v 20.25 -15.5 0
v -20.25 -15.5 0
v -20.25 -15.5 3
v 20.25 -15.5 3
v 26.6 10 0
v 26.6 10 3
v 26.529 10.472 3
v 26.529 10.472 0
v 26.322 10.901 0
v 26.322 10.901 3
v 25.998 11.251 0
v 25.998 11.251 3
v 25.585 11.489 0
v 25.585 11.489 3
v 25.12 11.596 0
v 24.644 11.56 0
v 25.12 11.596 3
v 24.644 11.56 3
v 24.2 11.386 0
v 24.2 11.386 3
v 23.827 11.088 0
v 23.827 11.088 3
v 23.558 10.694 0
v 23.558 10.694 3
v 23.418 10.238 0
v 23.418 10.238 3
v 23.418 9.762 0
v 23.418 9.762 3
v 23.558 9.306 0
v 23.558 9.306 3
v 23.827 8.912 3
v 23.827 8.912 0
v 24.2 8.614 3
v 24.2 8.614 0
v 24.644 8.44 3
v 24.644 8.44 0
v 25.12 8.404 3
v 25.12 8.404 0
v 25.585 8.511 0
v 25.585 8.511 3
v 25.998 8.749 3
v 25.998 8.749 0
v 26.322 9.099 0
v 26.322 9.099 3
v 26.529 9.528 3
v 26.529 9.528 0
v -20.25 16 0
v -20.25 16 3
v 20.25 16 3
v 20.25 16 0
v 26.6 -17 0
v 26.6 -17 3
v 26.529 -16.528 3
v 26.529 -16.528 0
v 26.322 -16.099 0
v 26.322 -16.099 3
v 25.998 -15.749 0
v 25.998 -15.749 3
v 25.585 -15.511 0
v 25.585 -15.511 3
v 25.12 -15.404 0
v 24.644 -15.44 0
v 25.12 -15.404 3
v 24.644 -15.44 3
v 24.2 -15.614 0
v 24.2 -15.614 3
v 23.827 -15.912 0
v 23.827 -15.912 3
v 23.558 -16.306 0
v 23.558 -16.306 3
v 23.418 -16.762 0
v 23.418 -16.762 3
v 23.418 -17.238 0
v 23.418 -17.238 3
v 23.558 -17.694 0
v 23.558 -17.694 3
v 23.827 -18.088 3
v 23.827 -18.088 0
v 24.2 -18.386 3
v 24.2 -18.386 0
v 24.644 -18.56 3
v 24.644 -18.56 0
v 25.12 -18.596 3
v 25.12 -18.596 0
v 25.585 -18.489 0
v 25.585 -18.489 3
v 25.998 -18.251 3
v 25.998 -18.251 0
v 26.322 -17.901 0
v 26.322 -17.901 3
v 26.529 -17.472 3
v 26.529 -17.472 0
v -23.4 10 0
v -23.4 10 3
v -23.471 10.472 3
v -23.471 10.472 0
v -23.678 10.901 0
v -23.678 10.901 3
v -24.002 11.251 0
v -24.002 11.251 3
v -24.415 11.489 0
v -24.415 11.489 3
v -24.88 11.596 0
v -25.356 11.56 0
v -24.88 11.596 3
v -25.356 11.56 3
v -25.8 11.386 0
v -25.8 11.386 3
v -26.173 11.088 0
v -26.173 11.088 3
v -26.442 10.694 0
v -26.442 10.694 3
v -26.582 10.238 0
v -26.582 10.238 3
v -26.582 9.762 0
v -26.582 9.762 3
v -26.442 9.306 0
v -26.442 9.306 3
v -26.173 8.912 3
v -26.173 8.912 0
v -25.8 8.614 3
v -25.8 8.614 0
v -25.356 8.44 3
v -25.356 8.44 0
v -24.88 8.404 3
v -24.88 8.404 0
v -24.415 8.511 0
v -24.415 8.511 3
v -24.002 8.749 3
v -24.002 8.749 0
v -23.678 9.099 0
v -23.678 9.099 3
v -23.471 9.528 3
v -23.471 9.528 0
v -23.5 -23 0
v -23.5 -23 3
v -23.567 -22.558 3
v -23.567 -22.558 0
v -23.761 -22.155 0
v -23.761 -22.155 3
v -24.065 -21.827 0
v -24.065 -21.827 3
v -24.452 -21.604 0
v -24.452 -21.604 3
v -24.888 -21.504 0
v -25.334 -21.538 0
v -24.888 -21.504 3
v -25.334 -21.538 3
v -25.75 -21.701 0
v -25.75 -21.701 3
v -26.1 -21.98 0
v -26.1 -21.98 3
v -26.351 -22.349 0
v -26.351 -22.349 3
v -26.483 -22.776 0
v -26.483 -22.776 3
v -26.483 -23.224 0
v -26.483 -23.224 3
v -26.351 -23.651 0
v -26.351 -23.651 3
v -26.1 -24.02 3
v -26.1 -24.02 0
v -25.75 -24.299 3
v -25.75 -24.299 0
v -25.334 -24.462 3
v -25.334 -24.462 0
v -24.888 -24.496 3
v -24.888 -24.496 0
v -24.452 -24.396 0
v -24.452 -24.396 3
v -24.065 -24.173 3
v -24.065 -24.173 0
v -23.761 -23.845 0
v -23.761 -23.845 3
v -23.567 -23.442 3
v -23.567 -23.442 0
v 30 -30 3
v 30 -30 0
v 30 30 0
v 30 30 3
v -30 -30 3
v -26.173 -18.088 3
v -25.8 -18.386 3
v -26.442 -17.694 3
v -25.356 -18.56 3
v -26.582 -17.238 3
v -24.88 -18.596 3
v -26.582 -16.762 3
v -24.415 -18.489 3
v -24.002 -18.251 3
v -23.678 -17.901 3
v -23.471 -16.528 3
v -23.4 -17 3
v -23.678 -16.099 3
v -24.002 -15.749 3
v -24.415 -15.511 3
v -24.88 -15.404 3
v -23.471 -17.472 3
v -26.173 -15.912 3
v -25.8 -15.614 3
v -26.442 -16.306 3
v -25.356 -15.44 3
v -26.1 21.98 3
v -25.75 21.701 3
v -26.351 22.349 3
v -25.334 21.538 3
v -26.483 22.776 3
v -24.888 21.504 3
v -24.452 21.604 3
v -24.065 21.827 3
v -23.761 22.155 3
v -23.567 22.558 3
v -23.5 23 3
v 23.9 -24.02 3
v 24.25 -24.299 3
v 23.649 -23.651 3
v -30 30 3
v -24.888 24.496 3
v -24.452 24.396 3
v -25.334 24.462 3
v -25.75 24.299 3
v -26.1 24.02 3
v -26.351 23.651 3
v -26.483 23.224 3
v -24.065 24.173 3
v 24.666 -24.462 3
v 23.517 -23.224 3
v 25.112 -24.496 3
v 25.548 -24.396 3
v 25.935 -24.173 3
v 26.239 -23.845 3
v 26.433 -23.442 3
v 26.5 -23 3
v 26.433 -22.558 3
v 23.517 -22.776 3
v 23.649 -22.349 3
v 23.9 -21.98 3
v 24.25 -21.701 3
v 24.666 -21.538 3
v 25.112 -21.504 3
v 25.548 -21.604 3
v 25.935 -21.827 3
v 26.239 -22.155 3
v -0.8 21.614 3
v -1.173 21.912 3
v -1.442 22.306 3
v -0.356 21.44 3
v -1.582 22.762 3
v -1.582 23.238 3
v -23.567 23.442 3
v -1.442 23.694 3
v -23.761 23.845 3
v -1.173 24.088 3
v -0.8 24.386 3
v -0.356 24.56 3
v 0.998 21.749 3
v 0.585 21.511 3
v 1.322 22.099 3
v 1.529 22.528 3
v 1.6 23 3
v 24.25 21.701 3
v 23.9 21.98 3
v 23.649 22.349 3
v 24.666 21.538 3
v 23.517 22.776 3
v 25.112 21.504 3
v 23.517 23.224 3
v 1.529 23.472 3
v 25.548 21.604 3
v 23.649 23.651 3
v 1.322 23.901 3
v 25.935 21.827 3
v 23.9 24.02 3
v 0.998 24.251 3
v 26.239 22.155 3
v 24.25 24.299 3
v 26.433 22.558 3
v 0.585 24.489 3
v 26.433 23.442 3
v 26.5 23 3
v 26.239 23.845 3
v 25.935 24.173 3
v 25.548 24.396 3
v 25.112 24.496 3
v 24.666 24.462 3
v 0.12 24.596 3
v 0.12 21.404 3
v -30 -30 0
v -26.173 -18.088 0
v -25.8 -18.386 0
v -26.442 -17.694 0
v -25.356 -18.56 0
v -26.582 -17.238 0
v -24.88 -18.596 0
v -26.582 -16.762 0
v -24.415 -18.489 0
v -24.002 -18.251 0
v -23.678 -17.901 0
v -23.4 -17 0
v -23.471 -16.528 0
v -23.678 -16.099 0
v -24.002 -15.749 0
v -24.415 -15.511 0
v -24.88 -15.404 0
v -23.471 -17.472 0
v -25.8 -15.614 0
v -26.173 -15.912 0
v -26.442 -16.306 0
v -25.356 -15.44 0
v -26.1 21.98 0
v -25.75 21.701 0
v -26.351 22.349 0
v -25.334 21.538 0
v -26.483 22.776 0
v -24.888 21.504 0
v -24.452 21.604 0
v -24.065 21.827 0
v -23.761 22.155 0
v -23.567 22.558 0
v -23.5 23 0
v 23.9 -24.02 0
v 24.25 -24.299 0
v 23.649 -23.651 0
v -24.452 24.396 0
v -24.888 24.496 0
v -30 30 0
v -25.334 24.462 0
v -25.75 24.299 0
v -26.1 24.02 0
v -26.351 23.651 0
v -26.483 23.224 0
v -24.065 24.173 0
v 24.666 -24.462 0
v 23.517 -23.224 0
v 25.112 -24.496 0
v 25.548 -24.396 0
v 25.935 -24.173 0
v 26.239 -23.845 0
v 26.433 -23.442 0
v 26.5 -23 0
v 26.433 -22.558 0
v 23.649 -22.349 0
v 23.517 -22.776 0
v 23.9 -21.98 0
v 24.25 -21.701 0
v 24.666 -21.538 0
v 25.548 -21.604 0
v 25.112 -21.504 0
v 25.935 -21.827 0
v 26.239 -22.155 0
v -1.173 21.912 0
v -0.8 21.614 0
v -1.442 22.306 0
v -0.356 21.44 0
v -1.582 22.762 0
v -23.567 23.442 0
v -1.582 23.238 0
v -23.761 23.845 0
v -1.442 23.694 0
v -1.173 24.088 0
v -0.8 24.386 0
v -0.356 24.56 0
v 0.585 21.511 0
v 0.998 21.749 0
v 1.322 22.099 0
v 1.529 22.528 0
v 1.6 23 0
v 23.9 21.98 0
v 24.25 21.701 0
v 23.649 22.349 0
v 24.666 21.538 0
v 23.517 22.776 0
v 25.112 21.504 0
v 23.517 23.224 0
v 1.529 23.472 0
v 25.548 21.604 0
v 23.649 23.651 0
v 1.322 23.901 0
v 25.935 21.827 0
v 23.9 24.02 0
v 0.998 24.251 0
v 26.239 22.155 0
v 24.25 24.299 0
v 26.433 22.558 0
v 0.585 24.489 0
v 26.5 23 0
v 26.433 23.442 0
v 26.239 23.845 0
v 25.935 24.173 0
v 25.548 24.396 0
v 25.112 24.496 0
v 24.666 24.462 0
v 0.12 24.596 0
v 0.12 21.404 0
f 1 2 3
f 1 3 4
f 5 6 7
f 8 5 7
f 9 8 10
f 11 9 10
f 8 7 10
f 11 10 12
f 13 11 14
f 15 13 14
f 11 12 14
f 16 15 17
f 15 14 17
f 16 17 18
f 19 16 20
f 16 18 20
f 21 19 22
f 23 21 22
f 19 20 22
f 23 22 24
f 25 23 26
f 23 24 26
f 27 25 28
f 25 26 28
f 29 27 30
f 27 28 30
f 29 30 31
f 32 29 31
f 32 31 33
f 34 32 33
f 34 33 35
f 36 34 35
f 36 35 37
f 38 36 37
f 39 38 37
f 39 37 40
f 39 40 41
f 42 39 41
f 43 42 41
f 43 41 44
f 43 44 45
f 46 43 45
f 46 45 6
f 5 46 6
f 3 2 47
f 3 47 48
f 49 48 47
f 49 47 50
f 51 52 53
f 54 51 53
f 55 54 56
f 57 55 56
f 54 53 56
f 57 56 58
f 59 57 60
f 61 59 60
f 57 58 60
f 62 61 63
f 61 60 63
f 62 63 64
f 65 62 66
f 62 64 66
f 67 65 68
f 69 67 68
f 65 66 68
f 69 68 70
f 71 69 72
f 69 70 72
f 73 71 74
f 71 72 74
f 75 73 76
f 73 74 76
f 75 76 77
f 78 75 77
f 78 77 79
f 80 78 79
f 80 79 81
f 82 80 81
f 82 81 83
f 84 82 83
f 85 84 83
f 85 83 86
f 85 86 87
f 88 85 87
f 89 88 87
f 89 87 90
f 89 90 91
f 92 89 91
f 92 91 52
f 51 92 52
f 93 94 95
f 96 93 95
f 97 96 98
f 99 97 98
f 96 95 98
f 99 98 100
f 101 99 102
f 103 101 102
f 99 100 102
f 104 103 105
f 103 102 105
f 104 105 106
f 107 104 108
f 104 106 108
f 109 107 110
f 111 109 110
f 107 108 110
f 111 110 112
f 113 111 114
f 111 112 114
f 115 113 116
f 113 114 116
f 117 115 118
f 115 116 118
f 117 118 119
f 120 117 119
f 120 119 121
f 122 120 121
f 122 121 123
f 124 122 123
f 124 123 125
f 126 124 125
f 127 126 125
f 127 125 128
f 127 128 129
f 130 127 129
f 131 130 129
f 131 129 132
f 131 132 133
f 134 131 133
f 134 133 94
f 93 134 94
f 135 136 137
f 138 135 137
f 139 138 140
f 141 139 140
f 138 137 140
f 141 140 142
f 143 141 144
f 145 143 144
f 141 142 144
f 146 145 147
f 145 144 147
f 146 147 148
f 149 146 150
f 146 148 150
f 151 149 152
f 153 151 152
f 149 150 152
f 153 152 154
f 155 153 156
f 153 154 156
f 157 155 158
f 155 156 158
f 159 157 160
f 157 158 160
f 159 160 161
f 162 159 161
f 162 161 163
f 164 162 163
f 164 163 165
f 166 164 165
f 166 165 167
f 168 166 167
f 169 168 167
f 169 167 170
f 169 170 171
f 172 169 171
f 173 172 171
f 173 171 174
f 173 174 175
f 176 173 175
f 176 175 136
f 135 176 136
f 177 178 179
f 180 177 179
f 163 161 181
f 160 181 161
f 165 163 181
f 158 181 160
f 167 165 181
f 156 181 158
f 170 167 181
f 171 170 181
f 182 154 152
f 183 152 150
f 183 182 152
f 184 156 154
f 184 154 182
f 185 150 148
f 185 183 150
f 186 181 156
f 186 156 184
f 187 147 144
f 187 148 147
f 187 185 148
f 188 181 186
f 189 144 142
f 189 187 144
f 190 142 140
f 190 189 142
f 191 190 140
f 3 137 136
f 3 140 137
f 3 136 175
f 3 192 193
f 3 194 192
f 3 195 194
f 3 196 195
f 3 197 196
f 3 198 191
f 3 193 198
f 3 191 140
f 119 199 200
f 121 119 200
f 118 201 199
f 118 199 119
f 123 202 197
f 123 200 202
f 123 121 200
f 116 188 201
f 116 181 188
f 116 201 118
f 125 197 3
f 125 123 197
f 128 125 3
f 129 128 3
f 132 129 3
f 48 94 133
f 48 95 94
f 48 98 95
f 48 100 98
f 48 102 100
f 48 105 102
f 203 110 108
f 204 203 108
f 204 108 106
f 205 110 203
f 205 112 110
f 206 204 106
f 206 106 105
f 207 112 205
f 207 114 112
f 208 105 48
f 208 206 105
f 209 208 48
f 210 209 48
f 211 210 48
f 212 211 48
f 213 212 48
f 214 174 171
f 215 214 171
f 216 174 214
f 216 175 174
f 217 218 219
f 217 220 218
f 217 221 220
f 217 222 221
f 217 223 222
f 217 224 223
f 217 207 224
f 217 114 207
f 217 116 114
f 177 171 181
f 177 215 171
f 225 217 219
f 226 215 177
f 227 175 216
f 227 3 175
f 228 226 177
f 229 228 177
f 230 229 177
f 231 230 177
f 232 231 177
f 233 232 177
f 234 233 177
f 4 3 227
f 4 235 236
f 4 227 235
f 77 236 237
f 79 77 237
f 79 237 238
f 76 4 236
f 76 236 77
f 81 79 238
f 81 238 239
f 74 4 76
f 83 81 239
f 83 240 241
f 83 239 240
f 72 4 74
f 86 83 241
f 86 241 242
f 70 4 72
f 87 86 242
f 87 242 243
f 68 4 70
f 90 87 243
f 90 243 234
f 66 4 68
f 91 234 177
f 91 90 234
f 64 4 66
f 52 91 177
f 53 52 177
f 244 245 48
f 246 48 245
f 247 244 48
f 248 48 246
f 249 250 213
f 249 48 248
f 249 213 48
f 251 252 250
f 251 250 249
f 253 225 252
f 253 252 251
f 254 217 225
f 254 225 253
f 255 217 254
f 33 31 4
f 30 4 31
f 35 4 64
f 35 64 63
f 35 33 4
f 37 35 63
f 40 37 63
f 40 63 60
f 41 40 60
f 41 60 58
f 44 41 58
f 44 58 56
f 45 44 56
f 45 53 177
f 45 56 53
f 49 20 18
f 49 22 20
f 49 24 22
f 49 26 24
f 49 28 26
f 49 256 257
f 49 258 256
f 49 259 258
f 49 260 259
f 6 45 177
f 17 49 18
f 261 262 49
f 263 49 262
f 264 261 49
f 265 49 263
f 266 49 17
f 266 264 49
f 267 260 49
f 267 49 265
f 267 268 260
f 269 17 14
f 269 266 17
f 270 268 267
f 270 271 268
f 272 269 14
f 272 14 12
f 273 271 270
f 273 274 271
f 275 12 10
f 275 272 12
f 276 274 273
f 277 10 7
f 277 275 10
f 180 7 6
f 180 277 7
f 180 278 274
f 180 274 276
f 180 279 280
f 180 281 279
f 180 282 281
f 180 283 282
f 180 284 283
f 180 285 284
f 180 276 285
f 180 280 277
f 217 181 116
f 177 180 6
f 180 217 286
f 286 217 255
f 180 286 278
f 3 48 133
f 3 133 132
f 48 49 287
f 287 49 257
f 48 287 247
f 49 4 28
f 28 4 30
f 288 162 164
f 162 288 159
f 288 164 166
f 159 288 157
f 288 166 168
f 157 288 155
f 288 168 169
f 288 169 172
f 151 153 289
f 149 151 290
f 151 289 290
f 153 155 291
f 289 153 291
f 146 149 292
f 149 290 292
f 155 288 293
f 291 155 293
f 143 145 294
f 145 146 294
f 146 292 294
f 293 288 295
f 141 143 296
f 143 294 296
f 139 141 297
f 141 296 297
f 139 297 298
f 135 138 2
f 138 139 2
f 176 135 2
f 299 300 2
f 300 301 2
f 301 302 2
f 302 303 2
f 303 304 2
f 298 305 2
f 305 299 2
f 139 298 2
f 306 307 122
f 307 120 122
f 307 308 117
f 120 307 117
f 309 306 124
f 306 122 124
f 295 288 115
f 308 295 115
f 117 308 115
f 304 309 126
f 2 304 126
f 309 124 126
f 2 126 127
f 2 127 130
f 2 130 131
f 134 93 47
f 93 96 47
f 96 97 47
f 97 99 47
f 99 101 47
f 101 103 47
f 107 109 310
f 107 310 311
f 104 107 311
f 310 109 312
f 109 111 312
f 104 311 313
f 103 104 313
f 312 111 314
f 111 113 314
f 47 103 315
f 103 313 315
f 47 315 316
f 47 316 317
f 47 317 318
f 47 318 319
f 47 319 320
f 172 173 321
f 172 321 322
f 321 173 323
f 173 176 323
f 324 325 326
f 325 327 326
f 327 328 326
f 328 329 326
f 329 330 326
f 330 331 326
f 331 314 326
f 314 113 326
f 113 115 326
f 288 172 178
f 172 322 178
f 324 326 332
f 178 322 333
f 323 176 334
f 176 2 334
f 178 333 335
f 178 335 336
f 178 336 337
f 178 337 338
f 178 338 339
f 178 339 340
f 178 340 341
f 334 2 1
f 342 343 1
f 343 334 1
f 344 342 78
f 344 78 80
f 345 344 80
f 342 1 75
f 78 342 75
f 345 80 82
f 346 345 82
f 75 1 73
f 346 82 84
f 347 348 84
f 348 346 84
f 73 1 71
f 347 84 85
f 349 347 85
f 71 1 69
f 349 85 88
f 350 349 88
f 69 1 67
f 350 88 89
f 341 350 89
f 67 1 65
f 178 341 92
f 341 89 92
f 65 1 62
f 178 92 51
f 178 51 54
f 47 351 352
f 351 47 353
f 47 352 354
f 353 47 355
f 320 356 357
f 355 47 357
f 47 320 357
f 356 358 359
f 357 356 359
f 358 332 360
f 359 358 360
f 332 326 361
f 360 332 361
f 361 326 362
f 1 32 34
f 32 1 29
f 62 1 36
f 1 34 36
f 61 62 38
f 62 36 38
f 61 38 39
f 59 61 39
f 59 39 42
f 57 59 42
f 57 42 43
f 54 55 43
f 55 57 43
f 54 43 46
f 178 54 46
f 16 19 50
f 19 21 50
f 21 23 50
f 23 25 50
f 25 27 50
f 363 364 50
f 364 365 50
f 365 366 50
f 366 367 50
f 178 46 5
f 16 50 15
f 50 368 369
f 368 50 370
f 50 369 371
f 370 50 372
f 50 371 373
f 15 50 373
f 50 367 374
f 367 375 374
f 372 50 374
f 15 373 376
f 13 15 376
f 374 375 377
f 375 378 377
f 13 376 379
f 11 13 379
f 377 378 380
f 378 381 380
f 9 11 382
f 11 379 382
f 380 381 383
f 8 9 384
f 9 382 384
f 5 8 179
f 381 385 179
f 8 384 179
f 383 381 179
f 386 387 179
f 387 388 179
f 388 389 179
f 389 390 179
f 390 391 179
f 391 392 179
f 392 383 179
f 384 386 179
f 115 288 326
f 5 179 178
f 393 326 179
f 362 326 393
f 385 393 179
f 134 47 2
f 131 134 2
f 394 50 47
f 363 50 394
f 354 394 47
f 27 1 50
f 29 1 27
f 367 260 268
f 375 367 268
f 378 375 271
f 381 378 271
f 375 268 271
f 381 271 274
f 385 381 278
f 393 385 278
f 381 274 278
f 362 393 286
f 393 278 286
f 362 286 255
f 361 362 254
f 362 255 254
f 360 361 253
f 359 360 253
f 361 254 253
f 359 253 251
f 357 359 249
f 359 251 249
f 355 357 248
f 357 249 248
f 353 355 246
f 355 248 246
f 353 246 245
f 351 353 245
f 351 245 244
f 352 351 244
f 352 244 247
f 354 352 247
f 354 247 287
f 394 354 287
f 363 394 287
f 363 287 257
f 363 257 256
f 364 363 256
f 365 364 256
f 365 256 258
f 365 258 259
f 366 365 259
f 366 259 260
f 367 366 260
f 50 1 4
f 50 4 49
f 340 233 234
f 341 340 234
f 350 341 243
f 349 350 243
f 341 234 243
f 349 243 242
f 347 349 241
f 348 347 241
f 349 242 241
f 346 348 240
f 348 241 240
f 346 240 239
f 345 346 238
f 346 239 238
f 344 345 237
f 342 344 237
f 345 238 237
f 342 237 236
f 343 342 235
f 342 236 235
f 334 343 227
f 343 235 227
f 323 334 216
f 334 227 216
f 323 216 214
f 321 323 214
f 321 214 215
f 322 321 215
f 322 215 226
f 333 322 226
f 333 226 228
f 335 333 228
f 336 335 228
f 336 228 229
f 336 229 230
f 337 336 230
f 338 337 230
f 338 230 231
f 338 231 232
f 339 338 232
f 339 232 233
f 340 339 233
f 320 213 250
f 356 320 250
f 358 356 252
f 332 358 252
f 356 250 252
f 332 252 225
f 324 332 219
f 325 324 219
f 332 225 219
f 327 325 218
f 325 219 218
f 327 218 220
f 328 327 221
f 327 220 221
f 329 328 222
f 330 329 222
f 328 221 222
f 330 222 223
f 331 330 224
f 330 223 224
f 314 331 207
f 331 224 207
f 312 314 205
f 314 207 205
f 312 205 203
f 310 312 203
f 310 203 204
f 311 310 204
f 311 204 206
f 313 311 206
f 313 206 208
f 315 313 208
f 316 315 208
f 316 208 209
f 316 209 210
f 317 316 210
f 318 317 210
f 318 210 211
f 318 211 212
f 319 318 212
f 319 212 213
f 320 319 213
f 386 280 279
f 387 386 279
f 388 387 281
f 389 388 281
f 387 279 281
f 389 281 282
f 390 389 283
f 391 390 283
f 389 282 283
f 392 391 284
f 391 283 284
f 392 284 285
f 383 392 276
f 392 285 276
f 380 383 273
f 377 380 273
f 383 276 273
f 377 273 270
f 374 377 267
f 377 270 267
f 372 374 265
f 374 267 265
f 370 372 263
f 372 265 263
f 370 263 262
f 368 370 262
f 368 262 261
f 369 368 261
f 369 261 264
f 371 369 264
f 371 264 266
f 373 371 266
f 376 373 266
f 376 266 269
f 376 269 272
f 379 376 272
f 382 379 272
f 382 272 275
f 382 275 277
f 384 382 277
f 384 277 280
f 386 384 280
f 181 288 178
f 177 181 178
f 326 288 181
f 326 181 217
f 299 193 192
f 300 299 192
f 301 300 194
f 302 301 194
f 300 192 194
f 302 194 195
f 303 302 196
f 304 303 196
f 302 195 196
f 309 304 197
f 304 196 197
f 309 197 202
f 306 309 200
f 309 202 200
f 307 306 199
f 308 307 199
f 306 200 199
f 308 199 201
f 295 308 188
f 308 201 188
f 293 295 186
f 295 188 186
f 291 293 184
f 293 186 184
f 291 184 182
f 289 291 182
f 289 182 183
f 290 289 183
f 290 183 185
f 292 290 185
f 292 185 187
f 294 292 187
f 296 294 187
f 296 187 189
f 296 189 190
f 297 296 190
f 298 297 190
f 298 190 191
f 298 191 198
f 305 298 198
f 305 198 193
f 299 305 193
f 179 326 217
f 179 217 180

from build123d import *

# Parameters (mm, degrees)
F0_W     = 60
F0_H     = 60
F0_W_2   = 40.5
F0_H_2   = 31
F1_DEPTH = 3
F2_R     = 1.5
F3_DEPTH = 3.001
F4_W     = 40.5
F4_H     = 3
F5_DEPTH = 0.5
F6_R     = 1.6
F7_DEPTH = 3.001


with BuildPart() as f1:
    # F0 (on Top) → F1 (new body)
    with BuildSketch(Plane.XY):
        Rectangle(F0_W, F0_H)
        Rectangle(F0_W_2, F0_H_2, mode=Mode.SUBTRACT)
    extrude(amount=F1_DEPTH)

    # F2 (on face) → F3 (cut, through all)
    with BuildSketch(Plane.XY.offset(3)):
        with Locations((-25, -23)):
            Circle(F2_R)
        with Locations((-25, 23)):
            Circle(F2_R)
        with Locations((25, 23)):
            Circle(F2_R)
        with Locations((25, -23)):
            Circle(F2_R)
    extrude(amount=-F3_DEPTH, mode=Mode.SUBTRACT)

    # F4 (on face) → F5 (cut)
    with BuildSketch(Plane.XZ.offset(-15.5)):
        with Locations((0, 1.5)):
            Rectangle(F4_W, F4_H)
    extrude(amount=-F5_DEPTH, mode=Mode.SUBTRACT)

    # F6 (on face) → F7 (cut, through all)
    with BuildSketch(Plane.XY.offset(3)):
        with Locations((-25, 10)):
            Circle(F6_R)
        with Locations((-25, -17)):
            Circle(F6_R)
        with Locations((25, 10)):
            Circle(F6_R)
        with Locations((25, -17)):
            Circle(F6_R)
        with Locations((0, 23)):
            Circle(F6_R)
    extrude(amount=-F7_DEPTH, mode=Mode.SUBTRACT)


solid = f1.part
